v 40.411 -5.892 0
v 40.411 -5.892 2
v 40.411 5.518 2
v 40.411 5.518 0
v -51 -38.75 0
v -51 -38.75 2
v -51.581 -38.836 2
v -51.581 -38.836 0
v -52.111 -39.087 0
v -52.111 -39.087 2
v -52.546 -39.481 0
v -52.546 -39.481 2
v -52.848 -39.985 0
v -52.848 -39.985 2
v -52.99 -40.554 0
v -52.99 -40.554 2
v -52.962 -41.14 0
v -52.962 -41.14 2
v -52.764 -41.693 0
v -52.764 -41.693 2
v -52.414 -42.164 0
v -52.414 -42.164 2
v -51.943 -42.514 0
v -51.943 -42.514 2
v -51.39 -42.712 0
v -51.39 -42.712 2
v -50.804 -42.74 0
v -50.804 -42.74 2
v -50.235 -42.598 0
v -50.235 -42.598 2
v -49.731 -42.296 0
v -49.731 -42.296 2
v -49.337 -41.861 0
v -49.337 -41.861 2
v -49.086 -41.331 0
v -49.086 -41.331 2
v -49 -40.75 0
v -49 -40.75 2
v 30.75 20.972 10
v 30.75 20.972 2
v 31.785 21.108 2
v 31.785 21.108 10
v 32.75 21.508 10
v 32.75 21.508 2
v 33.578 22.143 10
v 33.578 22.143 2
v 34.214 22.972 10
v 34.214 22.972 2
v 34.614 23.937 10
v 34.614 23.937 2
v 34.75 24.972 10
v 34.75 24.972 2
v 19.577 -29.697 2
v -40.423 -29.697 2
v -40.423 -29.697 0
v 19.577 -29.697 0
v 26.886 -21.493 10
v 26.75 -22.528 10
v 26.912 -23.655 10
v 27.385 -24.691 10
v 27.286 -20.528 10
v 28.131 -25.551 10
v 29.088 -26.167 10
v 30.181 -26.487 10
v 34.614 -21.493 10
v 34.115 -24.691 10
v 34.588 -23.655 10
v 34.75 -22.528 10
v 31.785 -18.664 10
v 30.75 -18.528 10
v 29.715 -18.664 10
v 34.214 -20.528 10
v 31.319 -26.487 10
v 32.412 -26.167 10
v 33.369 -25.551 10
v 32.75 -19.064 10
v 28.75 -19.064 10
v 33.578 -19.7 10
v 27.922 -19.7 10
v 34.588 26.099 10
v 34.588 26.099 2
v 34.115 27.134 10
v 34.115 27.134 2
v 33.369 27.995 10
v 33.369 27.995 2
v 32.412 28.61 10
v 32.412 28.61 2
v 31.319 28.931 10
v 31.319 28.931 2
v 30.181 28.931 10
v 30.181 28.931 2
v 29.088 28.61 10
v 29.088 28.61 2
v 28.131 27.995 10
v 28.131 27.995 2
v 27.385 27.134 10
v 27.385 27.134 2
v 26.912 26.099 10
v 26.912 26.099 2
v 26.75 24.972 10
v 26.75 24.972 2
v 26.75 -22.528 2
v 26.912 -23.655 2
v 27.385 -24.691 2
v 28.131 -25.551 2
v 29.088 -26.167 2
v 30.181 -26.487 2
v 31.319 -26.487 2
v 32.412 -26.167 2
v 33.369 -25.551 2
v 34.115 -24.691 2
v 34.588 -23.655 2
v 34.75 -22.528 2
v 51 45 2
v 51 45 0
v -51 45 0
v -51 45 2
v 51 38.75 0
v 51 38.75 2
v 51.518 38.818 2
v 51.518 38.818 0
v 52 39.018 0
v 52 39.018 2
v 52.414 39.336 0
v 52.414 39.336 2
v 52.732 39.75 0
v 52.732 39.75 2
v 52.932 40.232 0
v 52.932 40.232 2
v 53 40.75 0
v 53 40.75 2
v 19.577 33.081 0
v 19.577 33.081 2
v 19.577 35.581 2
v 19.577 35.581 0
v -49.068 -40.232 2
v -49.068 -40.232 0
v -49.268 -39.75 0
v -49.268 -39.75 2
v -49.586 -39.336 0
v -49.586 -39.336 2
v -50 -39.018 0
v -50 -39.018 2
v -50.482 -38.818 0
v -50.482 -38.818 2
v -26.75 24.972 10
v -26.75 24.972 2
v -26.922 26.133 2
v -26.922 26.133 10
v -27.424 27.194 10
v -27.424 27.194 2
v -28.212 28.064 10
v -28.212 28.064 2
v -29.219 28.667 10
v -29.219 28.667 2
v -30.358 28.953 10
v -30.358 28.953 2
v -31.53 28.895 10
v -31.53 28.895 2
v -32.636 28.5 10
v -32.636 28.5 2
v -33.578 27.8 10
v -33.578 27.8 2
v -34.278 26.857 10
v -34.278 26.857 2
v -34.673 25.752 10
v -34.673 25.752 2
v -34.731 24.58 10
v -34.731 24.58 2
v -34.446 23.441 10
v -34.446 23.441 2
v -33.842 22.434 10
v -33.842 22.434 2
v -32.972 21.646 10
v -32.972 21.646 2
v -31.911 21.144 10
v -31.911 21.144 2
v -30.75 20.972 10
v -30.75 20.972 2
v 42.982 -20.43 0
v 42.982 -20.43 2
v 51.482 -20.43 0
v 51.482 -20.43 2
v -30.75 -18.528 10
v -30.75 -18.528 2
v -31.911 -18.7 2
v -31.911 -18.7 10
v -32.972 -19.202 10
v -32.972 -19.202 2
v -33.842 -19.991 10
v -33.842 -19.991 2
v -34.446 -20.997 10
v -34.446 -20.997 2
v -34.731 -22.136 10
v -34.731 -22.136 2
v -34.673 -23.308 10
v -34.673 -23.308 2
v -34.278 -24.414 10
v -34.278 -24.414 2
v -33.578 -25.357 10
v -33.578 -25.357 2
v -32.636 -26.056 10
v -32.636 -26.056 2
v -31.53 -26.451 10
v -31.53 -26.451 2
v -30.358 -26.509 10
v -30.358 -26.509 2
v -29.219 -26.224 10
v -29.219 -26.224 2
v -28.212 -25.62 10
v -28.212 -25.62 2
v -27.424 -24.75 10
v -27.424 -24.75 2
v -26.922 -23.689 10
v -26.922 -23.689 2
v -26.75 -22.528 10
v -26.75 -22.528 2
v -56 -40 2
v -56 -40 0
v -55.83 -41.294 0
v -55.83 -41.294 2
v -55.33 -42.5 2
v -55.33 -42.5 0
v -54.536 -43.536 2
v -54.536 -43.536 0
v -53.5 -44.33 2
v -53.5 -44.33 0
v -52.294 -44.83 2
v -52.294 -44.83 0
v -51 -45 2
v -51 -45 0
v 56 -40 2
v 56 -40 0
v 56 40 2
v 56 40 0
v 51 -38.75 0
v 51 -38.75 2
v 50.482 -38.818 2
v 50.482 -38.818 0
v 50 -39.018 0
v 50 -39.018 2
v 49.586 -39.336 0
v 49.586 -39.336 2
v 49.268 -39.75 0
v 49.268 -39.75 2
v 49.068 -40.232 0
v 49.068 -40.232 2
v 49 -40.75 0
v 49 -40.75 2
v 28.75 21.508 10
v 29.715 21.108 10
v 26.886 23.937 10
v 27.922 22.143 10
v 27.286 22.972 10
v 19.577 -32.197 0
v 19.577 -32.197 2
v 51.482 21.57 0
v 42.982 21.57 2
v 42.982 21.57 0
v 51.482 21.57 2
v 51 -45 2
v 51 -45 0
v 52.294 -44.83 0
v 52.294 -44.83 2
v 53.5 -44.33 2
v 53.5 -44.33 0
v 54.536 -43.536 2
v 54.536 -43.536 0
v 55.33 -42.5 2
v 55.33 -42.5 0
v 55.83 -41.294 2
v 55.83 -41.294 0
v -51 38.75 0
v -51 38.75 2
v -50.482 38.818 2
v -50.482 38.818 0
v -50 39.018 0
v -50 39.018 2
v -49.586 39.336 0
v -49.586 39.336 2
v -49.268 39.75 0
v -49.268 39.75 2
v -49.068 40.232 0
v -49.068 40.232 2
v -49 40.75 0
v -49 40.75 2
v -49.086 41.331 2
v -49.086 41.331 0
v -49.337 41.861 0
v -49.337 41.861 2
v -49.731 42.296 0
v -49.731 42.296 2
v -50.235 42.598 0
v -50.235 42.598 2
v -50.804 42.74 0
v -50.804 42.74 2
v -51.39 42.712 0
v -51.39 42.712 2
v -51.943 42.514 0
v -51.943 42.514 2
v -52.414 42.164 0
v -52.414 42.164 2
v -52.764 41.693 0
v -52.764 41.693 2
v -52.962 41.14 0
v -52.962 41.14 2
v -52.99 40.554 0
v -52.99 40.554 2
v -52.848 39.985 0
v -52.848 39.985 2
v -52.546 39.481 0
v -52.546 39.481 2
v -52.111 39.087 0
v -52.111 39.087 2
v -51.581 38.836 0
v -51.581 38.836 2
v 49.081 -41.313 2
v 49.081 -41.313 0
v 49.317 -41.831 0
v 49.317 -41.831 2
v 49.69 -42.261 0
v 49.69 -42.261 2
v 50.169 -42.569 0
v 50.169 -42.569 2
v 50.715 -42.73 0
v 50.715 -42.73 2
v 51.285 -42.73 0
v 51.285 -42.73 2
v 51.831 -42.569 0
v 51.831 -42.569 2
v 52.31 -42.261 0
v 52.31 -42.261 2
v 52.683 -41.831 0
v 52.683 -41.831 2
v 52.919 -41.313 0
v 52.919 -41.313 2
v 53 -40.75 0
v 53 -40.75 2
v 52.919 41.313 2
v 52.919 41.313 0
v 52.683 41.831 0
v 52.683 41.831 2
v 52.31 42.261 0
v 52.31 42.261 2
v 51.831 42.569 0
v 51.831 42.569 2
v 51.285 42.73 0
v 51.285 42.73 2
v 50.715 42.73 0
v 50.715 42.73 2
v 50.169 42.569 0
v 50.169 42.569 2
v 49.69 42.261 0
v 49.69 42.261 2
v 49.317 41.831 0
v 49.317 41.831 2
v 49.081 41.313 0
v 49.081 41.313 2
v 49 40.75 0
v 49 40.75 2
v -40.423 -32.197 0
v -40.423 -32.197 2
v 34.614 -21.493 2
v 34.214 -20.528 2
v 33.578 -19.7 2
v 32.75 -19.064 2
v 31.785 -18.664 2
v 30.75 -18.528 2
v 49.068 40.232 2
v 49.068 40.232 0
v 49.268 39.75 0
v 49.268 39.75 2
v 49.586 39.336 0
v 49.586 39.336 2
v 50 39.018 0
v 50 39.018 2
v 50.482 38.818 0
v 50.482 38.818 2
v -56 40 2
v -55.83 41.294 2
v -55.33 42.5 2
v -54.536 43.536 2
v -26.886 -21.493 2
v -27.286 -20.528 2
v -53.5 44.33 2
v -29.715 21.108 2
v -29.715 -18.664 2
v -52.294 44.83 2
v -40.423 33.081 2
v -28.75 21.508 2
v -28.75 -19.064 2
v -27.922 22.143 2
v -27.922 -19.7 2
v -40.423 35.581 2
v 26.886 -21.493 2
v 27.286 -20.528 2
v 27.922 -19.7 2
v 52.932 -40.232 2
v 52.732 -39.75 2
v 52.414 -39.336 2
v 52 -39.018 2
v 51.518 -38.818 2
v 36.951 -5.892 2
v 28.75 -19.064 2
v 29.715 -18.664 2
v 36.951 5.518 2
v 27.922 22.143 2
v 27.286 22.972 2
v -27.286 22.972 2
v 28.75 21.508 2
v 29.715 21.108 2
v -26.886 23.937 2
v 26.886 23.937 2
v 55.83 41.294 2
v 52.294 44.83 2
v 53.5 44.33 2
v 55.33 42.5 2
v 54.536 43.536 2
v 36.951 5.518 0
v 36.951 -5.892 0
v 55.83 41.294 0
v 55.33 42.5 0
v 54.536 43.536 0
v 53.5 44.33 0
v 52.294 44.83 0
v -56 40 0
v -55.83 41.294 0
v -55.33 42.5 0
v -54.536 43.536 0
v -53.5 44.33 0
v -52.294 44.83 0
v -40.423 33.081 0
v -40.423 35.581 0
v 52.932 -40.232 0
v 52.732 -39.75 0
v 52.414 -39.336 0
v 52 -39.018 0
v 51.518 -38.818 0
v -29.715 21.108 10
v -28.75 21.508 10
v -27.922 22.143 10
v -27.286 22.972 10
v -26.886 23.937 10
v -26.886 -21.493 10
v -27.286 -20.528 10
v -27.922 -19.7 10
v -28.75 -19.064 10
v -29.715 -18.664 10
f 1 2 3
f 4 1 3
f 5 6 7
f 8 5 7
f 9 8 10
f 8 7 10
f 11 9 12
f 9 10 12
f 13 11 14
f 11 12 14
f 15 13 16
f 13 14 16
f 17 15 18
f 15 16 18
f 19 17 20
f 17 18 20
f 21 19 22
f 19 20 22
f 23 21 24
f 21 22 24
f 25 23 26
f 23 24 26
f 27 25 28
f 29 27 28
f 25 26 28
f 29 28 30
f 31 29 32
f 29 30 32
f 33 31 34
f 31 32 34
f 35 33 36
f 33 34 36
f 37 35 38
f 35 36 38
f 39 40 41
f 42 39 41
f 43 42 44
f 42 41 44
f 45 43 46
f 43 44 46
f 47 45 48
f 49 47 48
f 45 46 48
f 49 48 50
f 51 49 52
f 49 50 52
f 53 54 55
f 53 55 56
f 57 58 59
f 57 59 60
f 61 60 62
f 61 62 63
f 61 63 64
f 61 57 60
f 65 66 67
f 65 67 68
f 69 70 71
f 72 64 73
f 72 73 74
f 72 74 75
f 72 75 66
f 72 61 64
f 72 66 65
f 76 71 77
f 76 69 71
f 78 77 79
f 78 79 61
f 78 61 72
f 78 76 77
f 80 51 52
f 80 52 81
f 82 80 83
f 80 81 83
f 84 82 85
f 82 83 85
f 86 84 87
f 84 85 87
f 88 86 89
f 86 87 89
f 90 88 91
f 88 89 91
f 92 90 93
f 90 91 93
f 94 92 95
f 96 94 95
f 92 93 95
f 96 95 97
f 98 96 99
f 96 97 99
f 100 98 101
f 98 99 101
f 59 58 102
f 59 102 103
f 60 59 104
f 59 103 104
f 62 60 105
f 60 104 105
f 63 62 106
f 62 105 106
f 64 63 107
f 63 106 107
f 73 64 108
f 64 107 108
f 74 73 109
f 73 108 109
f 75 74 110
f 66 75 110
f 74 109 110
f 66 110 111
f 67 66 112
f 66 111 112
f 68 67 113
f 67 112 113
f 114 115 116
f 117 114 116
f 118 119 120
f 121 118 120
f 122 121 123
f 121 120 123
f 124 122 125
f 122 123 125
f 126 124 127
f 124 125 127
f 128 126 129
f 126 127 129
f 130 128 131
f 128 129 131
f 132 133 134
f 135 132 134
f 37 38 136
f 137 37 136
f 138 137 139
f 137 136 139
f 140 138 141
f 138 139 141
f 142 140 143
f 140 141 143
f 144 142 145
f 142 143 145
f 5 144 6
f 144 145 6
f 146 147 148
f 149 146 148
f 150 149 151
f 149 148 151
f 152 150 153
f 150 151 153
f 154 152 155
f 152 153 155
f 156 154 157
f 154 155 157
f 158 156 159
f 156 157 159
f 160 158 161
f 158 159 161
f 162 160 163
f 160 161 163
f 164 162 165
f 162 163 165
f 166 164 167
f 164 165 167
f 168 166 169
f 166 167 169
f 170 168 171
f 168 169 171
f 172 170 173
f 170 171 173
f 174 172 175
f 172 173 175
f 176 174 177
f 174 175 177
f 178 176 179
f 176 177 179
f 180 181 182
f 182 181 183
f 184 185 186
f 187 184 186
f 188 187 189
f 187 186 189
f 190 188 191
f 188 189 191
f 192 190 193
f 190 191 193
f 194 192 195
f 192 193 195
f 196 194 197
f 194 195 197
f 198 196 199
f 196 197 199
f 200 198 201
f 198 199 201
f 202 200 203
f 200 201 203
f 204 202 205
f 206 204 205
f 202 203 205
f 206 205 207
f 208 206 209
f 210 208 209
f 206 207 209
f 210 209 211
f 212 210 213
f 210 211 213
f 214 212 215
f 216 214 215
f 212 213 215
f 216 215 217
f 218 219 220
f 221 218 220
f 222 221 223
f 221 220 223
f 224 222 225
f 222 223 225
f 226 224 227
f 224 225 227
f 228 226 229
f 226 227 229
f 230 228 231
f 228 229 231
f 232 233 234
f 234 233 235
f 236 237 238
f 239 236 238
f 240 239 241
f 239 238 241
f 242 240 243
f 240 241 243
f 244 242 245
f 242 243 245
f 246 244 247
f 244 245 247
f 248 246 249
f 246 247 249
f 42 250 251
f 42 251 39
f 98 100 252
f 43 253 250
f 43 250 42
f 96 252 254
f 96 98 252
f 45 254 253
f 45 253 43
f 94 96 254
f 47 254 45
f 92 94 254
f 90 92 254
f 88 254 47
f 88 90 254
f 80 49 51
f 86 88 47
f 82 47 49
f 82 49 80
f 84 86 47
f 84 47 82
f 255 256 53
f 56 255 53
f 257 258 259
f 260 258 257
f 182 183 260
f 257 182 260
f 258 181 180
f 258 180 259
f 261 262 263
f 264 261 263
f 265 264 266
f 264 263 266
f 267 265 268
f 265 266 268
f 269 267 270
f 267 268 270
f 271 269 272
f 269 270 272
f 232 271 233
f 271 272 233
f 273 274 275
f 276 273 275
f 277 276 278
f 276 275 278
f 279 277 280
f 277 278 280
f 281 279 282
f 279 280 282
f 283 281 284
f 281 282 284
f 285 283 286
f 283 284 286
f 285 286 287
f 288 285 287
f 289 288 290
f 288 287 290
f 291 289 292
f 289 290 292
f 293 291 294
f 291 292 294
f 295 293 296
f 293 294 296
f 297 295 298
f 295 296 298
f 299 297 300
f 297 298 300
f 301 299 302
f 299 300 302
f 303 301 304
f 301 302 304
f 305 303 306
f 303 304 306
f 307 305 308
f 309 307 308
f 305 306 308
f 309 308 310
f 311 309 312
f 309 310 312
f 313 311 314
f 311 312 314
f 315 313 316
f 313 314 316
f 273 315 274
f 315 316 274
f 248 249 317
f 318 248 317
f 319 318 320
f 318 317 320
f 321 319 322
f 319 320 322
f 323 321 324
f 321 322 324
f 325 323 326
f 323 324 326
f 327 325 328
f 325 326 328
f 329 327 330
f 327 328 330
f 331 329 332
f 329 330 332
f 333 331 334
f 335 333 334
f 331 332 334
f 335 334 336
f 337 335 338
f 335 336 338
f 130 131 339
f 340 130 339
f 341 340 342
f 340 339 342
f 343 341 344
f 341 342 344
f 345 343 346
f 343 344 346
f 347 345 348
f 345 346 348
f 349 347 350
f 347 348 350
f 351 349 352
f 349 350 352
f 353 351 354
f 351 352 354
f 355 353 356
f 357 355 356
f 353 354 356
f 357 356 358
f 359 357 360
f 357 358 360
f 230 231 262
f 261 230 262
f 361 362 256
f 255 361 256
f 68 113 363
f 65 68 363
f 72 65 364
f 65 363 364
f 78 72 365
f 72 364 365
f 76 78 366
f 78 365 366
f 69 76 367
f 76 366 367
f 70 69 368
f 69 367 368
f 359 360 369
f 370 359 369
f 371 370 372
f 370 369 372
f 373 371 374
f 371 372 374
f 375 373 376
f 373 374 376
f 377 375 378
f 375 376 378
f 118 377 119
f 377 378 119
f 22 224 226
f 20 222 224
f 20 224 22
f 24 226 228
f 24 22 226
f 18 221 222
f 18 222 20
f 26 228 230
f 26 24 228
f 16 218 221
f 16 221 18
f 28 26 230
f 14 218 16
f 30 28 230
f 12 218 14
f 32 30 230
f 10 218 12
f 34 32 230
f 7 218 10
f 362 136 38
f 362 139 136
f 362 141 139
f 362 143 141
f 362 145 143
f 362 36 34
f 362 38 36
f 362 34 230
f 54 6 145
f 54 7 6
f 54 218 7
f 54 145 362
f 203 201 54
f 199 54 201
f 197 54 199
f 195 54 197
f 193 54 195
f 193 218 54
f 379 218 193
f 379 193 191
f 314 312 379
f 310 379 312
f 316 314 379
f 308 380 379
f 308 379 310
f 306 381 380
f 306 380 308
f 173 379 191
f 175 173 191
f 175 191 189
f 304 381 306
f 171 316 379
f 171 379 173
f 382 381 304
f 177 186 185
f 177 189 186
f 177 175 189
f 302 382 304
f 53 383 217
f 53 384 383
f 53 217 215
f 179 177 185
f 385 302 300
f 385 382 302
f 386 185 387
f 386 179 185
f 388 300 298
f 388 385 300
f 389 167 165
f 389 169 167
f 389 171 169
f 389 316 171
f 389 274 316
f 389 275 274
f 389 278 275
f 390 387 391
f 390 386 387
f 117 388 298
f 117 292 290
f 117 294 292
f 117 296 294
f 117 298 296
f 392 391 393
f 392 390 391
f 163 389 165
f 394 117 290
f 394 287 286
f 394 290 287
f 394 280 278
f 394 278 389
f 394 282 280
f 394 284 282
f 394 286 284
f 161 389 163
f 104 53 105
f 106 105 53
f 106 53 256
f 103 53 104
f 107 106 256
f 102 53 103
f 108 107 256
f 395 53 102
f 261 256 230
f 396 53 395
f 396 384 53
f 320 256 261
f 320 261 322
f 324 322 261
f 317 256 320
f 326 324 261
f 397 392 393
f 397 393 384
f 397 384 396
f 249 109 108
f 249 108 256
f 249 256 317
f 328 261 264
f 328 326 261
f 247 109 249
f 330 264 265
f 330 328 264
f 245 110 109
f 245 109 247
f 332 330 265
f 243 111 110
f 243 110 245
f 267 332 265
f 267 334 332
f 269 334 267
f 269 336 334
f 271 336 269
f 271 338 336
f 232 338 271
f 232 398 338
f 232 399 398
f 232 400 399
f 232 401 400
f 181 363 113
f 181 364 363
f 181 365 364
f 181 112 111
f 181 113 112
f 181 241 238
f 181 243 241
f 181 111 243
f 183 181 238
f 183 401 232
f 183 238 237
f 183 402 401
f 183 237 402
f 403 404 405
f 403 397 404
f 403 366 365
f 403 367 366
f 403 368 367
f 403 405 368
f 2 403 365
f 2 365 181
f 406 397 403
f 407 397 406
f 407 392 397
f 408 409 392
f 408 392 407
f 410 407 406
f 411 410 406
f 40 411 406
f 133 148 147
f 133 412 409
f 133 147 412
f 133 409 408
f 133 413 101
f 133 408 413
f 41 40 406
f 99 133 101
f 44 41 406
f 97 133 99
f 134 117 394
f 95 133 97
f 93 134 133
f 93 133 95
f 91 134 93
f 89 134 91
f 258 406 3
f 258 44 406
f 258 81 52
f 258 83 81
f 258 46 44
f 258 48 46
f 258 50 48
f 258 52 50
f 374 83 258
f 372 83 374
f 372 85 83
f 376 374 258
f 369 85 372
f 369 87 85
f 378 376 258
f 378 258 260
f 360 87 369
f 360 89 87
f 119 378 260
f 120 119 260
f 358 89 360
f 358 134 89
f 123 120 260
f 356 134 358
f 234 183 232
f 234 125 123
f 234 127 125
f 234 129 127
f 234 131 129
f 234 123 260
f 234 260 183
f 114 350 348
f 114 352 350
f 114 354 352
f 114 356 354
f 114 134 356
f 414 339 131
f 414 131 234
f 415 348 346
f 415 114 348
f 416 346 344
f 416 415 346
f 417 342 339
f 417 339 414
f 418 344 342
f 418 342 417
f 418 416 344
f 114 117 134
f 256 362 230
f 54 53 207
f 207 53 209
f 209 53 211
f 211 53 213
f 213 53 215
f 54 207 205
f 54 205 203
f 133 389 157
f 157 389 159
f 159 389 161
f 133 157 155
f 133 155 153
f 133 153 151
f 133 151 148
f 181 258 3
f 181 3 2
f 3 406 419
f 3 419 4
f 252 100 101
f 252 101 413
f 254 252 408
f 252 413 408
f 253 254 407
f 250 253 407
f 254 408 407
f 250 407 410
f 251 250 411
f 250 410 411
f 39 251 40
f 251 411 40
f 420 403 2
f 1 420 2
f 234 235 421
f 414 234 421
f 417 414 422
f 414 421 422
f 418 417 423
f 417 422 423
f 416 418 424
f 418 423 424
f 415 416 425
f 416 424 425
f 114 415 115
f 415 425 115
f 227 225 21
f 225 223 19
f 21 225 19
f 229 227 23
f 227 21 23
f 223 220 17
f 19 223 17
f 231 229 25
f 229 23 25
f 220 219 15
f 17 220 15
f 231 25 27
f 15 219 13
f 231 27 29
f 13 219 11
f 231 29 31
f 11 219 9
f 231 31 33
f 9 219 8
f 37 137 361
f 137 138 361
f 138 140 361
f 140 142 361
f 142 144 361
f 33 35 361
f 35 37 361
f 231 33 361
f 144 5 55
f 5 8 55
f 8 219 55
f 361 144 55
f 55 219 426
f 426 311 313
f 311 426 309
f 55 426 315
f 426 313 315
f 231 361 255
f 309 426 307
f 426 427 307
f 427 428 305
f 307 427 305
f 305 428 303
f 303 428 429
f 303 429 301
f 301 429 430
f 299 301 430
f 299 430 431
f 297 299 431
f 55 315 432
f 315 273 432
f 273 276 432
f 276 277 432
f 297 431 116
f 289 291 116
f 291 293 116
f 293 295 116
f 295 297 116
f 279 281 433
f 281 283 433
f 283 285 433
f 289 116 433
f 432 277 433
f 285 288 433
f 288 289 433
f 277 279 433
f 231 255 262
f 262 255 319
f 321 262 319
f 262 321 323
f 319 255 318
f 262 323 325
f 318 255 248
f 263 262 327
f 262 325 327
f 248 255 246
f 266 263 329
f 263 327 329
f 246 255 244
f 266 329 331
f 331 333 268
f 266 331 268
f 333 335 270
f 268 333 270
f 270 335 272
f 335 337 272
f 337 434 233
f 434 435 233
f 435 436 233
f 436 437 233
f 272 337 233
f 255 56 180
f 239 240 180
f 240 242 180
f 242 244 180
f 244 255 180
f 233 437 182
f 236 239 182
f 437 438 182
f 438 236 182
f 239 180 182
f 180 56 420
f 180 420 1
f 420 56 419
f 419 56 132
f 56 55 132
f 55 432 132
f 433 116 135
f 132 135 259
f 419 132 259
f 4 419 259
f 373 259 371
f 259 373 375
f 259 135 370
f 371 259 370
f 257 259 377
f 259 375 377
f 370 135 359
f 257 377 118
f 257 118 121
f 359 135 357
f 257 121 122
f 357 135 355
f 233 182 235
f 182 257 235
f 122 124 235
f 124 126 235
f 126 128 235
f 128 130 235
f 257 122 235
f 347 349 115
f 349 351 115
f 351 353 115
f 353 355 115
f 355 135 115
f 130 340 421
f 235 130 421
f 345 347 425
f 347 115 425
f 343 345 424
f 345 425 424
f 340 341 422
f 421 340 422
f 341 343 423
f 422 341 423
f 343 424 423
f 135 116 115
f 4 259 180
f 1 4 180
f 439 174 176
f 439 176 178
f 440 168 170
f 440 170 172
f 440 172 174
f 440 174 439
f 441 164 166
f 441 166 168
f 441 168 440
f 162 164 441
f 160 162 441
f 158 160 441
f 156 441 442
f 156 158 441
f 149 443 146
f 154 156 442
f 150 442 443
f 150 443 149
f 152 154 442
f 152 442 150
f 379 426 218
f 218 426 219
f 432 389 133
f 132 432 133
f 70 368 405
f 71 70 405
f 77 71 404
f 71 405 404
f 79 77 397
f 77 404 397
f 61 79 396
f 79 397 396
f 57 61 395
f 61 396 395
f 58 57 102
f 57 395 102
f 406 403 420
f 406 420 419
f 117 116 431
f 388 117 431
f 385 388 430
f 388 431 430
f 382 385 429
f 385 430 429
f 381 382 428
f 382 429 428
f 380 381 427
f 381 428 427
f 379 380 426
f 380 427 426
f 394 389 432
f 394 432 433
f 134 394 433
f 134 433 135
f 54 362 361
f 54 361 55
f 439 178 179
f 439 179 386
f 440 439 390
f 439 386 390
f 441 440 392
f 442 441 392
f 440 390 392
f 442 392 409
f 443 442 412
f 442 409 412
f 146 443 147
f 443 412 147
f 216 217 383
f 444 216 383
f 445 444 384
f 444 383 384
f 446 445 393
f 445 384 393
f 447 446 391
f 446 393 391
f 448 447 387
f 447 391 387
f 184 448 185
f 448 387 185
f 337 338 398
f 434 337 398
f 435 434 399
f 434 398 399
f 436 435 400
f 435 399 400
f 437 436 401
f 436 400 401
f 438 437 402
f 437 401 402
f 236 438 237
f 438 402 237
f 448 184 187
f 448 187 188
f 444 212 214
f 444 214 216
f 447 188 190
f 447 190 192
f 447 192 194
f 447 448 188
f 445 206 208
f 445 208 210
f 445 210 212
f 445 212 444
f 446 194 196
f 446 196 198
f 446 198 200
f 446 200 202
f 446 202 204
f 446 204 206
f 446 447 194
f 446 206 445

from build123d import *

# Parameters (mm, degrees)
F1_DEPTH  = 2
F2_W      = 8.5
F2_H      = 42
F3_DEPTH  = 25
F4_W      = 8.018283
F4_H      = 42
F5_DEPTH  = 25
F6_W      = 60
F6_H      = 2.5
F7_DEPTH  = 25
F9_DEPTH  = 8
F10_W     = 3.459897
F10_H     = 11.410049
F11_DEPTH = 25


with BuildPart() as f1:
    # F0 (on Top) → F1 (new body)
    with BuildSketch(Plane.XY):
        with BuildLine():
            ThreePointArc((56, 40), (54.535534, 43.535534), (51, 45))
            Line((51, 45), (-51, 45))
            ThreePointArc((-51, 45), (-54.535534, 43.535534), (-56, 40))
            Line((-56, 40), (-56, -40))
            ThreePointArc((-56, -40), (-54.535534, -43.535534), (-51, -45))
            Line((-51, -45), (51, -45))
            ThreePointArc((51, -45), (54.535534, -43.535534), (56, -40))
            Line((56, -40), (56, 40))
        make_face()
    extrude(amount=F1_DEPTH)

    # F2 (on face) → F3 (cut)
    with BuildSketch(Plane.XY.offset(2)):
        with Locations((47.231717, 0.56968)):
            Rectangle(F2_W, F2_H)
    extrude(amount=-F3_DEPTH, mode=Mode.SUBTRACT)

    # F4 (on face) → F5 (cut)
    with BuildSketch(Plane.XY.offset(2)):
        with Locations((46.990859, 0.56968)):
            Rectangle(F4_W, F4_H)
        with BuildLine():
            Line((51, 40.75), (49, 40.75))
            ThreePointArc((49, 40.75), (49.585786, 39.335786), (51, 38.75))
            Line((51, 38.75), (51, 40.75))
        make_face()
        with BuildLine():
            ThreePointArc((53, 40.75), (51, 42.75), (49, 40.75))
            Line((49, 40.75), (51, 40.75))
            Line((51, 40.75), (51, 38.75))
            ThreePointArc((51, 38.75), (52.414214, 39.335786), (53, 40.75))
        make_face()
        with BuildLine():
            Line((-51, 40.75), (-49, 40.75))
            ThreePointArc((-49, 40.75), (-52.414214, 42.164214), (-51, 38.75))
            Line((-51, 38.75), (-51, 40.75))
        make_face()
        with BuildLine():
            ThreePointArc((-51, 38.75), (-49.585786, 39.335786), (-49, 40.75))
            Line((-49, 40.75), (-51, 40.75))
            Line((-51, 40.75), (-51, 38.75))
        make_face()
        with BuildLine():
            ThreePointArc((51, -38.75), (49.585786, -39.335786), (49, -40.75))
            Line((49, -40.75), (51, -40.75))
            Line((51, -40.75), (51, -38.75))
        make_face()
        with BuildLine():
            Line((51, -40.75), (49, -40.75))
            ThreePointArc((49, -40.75), (51, -42.75), (53, -40.75))
            ThreePointArc((53, -40.75), (52.414214, -39.335786), (51, -38.75))
            Line((51, -38.75), (51, -40.75))
        make_face()
        with BuildLine():
            ThreePointArc((-49, -40.75), (-49.585786, -39.335786), (-51, -38.75))
            Line((-51, -38.75), (-51, -40.75))
            Line((-51, -40.75), (-49, -40.75))
        make_face()
        with BuildLine():
            Line((-51, -40.75), (-51, -38.75))
            ThreePointArc((-51, -38.75), (-52.414214, -42.164214), (-49, -40.75))
            Line((-49, -40.75), (-51, -40.75))
        make_face()
    extrude(amount=-F5_DEPTH, mode=Mode.SUBTRACT)

    # F6 (on face) → F7 (cut)
    with BuildSketch(Plane.XY.offset(2)):
        with Locations((-10.423255, 34.331246)):
            Rectangle(F6_W, F6_H)
        with Locations((-10.423255, -30.946578)):
            Rectangle(F6_W, F6_H)
    extrude(amount=-F7_DEPTH, mode=Mode.SUBTRACT)

    # F8 (on face) → F9 (join)
    with BuildSketch(Plane.XY.offset(2)):
        with BuildLine():
            Line((-30.75, -18.528093), (-30.75, -22.528093))
            Line((-30.75, -22.528093), (-26.75, -22.528093))
            ThreePointArc((-26.75, -22.528093), (-27.921573, -19.699666), (-30.75, -18.528093))
        make_face()
        with BuildLine():
            Line((-26.75, -22.528093), (-30.75, -22.528093))
            Line((-30.75, -22.528093), (-30.75, -18.528093))
            ThreePointArc((-30.75, -18.528093), (-33.578427, -25.35652), (-26.75, -22.528093))
        make_face()
        with BuildLine():
            ThreePointArc((30.75, -18.528093), (27.921573, -19.699666), (26.75, -22.528093))
            Line((26.75, -22.528093), (30.75, -22.528093))
            Line((30.75, -22.528093), (30.75, -18.528093))
        make_face()
        with BuildLine():
            Line((30.75, -22.528093), (26.75, -22.528093))
            ThreePointArc((26.75, -22.528093), (30.75, -26.528093), (34.75, -22.528093))
            ThreePointArc((34.75, -22.528093), (33.578427, -19.699666), (30.75, -18.528093))
            Line((30.75, -18.528093), (30.75, -22.528093))
        make_face()
        with BuildLine():
            ThreePointArc((-26.75, 24.971907), (-33.578427, 27.800334), (-30.75, 20.971907))
            Line((-30.75, 20.971907), (-30.75, 24.971907))
            Line((-30.75, 24.971907), (-26.75, 24.971907))
        make_face()
        with BuildLine():
            Line((-30.75, 24.971907), (-30.75, 20.971907))
            ThreePointArc((-30.75, 20.971907), (-27.921573, 22.14348), (-26.75, 24.971907))
            Line((-26.75, 24.971907), (-30.75, 24.971907))
        make_face()
        with BuildLine():
            ThreePointArc((26.75, 24.971907), (27.921573, 22.14348), (30.75, 20.971907))
            Line((30.75, 20.971907), (30.75, 24.971907))
            Line((30.75, 24.971907), (26.75, 24.971907))
        make_face()
        with BuildLine():
            Line((30.75, 24.971907), (30.75, 20.971907))
            ThreePointArc((30.75, 20.971907), (33.578427, 22.14348), (34.75, 24.971907))
            ThreePointArc((34.75, 24.971907), (30.75, 28.971907), (26.75, 24.971907))
            Line((26.75, 24.971907), (30.75, 24.971907))
        make_face()
    extrude(amount=F9_DEPTH)

    # F10 (on face) → F11 (cut)
    with BuildSketch(Plane.XY.offset(2)):
        with Locations((38.681185, -0.187257)):
            Rectangle(F10_W, F10_H)
    extrude(amount=-F11_DEPTH, mode=Mode.SUBTRACT)


solid = f1.part
